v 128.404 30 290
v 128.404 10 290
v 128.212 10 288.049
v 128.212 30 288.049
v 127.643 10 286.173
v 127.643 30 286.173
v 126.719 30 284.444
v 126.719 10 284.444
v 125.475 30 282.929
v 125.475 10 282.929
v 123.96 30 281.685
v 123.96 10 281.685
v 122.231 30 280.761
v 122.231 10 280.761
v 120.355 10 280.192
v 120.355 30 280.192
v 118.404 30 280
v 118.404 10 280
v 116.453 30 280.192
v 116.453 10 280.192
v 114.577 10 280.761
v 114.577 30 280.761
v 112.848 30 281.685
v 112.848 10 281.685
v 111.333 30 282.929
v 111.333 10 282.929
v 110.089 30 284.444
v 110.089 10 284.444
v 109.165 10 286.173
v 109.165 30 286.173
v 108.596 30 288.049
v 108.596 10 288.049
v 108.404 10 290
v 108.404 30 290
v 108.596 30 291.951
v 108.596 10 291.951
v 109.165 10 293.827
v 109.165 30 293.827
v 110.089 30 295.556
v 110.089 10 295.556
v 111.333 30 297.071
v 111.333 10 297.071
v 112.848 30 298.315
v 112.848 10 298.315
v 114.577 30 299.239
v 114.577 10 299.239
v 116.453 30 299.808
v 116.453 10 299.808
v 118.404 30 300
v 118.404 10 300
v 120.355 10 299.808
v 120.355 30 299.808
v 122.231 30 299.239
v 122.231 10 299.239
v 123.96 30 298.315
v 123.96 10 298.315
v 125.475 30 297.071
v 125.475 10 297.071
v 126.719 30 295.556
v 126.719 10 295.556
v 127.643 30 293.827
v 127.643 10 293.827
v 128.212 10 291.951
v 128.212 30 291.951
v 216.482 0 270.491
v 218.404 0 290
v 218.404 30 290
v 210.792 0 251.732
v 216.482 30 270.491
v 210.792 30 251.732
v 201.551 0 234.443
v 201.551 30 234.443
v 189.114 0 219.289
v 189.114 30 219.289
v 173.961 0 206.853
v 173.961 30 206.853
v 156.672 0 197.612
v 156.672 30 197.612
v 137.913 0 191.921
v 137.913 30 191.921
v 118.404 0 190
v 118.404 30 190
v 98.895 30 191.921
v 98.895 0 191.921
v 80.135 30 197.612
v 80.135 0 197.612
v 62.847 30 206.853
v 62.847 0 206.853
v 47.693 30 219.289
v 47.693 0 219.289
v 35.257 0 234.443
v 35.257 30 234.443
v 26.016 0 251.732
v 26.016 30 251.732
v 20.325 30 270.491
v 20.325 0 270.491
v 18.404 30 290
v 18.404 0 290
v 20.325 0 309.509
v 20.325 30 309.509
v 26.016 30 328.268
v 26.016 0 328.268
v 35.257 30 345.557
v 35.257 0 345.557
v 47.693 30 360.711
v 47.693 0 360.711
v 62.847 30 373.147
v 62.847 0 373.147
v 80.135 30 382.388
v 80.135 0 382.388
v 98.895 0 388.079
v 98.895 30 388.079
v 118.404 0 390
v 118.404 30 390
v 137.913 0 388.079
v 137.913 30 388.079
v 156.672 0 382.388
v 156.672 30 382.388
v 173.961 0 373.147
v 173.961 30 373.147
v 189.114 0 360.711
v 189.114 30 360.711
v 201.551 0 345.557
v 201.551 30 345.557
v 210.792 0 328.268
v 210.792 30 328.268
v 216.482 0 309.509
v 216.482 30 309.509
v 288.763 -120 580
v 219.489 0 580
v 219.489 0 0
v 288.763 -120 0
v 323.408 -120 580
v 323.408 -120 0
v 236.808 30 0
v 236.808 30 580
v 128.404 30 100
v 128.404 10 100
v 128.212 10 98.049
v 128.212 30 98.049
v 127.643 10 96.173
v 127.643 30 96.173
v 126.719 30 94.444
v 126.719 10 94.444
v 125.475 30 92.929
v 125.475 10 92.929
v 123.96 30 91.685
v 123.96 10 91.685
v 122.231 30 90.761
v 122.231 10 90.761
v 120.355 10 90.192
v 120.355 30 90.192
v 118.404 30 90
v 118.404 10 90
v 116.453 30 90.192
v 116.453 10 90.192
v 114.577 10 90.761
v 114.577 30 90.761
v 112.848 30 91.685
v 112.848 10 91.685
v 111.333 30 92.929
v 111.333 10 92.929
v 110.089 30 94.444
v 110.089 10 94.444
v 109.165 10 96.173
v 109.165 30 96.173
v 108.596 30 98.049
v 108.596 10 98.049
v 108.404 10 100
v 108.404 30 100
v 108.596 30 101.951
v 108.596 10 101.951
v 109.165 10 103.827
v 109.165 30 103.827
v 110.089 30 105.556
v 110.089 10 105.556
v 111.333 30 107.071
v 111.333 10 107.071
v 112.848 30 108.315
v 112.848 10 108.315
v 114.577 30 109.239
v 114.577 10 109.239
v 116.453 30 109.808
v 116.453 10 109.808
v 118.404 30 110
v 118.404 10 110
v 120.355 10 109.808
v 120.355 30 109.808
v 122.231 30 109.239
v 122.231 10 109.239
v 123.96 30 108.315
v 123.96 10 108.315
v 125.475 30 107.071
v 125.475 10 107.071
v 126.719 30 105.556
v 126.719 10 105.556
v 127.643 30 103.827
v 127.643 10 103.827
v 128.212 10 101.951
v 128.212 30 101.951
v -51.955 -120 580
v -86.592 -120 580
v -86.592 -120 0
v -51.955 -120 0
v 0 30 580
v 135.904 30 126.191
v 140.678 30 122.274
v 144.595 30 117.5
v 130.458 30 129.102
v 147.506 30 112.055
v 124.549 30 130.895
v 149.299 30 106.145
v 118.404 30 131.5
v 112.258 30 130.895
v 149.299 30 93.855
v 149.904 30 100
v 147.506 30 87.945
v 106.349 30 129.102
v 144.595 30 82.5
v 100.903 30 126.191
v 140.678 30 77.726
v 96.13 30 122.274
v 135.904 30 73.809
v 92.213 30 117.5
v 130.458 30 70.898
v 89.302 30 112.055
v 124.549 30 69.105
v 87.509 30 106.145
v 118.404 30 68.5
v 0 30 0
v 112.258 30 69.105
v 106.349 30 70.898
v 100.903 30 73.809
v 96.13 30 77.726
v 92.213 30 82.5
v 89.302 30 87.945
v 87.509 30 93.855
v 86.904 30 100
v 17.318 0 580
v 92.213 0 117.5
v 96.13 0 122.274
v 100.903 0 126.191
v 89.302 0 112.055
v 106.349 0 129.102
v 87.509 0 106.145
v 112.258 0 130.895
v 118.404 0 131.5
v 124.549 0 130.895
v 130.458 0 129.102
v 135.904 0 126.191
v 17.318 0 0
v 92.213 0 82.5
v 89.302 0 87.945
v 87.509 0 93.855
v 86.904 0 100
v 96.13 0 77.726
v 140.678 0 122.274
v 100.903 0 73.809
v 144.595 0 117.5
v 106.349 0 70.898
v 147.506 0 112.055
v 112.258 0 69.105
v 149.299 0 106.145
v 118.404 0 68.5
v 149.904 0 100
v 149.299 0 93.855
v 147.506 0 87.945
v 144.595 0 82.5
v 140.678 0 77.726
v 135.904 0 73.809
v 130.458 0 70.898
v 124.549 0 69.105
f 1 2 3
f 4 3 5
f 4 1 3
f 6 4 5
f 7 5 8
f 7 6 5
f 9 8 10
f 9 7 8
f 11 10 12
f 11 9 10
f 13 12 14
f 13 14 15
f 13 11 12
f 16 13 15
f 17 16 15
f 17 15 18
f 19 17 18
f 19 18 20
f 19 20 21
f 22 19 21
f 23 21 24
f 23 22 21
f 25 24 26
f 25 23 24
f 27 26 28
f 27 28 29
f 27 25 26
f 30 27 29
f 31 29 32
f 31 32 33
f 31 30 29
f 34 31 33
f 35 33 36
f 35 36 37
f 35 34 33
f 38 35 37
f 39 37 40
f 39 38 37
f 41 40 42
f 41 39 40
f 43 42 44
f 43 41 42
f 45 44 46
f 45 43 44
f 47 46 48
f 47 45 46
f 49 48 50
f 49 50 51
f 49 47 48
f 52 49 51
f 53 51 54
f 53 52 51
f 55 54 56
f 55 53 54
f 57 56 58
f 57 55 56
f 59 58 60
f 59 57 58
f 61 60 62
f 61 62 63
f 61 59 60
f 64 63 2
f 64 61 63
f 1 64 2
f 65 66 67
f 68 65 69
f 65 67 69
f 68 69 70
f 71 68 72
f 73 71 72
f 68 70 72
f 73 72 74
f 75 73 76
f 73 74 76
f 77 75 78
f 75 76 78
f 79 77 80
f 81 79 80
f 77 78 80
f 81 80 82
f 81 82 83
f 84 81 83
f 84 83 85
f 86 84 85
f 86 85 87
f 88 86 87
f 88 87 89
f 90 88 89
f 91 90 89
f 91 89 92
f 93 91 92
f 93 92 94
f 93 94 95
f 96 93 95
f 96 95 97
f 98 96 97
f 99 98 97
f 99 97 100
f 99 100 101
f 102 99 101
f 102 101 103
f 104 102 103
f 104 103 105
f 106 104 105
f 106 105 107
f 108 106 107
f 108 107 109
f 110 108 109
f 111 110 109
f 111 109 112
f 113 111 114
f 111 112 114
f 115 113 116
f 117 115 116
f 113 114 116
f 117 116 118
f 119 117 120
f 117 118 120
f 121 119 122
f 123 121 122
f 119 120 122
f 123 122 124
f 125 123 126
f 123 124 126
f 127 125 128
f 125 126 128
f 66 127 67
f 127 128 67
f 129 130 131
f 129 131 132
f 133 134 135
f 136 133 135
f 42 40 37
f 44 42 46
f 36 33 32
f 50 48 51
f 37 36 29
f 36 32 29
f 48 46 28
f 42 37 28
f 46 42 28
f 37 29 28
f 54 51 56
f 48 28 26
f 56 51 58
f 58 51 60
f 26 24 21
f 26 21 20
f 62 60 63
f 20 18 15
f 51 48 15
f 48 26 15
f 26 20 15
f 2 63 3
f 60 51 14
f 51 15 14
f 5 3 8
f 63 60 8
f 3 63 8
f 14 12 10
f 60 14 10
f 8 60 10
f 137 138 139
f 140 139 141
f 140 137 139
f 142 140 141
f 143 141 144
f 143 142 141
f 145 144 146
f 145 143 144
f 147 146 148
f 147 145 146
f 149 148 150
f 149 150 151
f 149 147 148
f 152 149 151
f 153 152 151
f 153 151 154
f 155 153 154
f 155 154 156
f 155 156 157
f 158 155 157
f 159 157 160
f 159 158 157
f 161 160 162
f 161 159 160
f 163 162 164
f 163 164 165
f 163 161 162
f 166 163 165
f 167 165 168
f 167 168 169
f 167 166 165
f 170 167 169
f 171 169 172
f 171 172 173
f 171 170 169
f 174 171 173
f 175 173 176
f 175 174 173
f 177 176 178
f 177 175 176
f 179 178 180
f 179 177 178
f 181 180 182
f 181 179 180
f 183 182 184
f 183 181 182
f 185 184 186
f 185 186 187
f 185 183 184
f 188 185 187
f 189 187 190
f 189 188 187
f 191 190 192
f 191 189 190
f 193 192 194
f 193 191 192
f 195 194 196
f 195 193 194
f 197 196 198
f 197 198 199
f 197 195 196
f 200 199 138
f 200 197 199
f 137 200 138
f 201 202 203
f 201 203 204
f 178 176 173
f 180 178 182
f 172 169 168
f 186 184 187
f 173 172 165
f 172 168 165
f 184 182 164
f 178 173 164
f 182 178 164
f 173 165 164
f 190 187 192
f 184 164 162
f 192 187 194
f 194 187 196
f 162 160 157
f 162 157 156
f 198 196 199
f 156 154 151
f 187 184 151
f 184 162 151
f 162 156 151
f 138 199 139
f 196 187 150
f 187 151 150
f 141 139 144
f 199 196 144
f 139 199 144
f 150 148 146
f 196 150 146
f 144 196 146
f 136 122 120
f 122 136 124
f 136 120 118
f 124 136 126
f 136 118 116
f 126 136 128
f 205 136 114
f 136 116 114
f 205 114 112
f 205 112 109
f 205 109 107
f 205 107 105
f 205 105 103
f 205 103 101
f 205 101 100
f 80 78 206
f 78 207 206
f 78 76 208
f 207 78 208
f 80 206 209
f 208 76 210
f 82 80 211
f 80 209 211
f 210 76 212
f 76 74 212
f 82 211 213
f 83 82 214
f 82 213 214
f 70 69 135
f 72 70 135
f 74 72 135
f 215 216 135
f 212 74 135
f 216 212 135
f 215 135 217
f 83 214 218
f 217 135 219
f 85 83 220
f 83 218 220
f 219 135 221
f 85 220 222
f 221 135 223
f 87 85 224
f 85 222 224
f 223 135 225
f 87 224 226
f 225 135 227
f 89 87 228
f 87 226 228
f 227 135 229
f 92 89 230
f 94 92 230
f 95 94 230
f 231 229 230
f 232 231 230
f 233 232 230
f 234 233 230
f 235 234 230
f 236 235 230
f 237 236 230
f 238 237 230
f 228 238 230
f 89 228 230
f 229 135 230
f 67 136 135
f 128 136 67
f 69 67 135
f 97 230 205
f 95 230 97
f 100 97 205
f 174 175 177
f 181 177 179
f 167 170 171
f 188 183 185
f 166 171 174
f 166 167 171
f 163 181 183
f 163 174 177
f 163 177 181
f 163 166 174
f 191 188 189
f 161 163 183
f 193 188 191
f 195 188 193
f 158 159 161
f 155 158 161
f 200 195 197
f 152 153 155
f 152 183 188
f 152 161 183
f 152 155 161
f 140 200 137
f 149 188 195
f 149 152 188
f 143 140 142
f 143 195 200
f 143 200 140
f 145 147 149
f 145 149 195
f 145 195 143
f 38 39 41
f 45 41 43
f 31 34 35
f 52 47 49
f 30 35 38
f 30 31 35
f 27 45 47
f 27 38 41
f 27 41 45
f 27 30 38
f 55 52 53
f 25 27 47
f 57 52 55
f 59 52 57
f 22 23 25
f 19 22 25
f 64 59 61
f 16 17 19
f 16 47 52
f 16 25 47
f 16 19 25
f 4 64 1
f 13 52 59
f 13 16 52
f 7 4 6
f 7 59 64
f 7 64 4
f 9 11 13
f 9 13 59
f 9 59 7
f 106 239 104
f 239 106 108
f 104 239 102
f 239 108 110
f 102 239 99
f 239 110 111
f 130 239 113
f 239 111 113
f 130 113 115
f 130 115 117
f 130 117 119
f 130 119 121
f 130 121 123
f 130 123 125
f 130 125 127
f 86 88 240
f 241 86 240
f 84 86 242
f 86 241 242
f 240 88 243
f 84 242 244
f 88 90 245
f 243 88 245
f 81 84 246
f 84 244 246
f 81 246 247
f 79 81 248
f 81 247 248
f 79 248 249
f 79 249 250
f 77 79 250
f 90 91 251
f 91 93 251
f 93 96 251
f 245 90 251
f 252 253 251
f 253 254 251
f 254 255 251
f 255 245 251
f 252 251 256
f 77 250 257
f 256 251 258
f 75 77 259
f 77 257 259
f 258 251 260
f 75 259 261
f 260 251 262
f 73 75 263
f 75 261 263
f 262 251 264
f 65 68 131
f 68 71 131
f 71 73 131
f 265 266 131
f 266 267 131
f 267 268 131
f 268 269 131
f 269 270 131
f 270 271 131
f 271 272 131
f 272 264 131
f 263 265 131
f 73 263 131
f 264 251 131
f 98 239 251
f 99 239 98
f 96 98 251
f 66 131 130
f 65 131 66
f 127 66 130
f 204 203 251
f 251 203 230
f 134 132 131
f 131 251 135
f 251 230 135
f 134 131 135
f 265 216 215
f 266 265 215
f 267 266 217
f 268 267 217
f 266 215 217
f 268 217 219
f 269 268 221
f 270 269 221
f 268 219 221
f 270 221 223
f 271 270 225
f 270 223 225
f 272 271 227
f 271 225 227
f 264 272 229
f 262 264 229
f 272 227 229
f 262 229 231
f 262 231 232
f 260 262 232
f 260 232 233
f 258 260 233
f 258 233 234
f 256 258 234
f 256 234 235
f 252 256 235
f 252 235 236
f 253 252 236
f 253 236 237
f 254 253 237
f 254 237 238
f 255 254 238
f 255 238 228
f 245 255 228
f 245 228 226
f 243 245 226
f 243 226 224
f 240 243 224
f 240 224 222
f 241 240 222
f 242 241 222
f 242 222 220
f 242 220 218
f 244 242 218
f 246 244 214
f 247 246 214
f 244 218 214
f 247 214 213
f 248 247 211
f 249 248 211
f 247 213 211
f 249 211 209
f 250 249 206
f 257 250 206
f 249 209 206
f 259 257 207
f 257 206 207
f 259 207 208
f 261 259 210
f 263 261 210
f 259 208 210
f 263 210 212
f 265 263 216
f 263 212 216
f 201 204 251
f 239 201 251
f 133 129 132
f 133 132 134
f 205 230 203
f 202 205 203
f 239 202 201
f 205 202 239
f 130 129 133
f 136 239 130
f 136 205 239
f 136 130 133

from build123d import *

# Parameters (mm, degrees)
BOSS_EXTRU_1_DEPTH      = 580
ENL_V_MAT_EXTRU_1_REACH = 152
ESQUISSE2_R             = 100
ESQUISSE2_R_2           = 31.5
ESQUISSE4_R             = 10
BOSS_EXTRU_2_DEPTH      = 20
ESQUISSE5_R             = 10
BOSS_EXTRU_3_DEPTH      = 20


with BuildPart() as part:
    # Esquisse1 → Boss.-Extru.1 (new body)
    with BuildSketch(Plane.XY):
        Polygon((236.807621582, 30), (0, 30), (-86.592378418, -120), (-51.955427051, -120), (17.318475684, 0), (219.489145899, 0), (288.763048633, -120), (323.407621582, -120), align=None)
    extrude(amount=BOSS_EXTRU_1_DEPTH)

    # Esquisse2 → Enlèv. mat.-Extru.1 (cut, up to next)
    with BuildSketch(Plane(origin=(0, 30, 0), x_dir=(1, 0, 0), z_dir=(0, 1, 0)), mode=Mode.PRIVATE) as enl_v_mat_extru_1_sk1:
        with Locations((118.403810791, -290)):
            Circle(ESQUISSE2_R)
    enl_v_mat_extru_1_tool1 = extrude(enl_v_mat_extru_1_sk1.sketch, amount=-ENL_V_MAT_EXTRU_1_REACH, mode=Mode.PRIVATE) & part.part
    add(enl_v_mat_extru_1_tool1.solids().sort_by_distance((118.403811, 30, 290))[0], mode=Mode.SUBTRACT)
    # Esquisse2 → Enlèv. mat.-Extru.1 (cut, up to next)
    with BuildSketch(Plane(origin=(0, 30, 0), x_dir=(1, 0, 0), z_dir=(0, 1, 0)), mode=Mode.PRIVATE) as enl_v_mat_extru_1_sk2:
        with Locations((118.403810791, -100)):
            Circle(ESQUISSE2_R_2)
    enl_v_mat_extru_1_tool2 = extrude(enl_v_mat_extru_1_sk2.sketch, amount=-ENL_V_MAT_EXTRU_1_REACH, mode=Mode.PRIVATE) & part.part
    add(enl_v_mat_extru_1_tool2.solids().sort_by_distance((118.403811, 30, 100))[0], mode=Mode.SUBTRACT)


with BuildPart() as body_2:
    # Esquisse4 → Boss.-Extru.2 (new body)
    with BuildSketch(Plane(origin=(0, 30, 0), x_dir=(1, 0, 0), z_dir=(0, 1, 0))):
        with Locations((118.403810791, -290)):
            Circle(ESQUISSE4_R)
    extrude(amount=-BOSS_EXTRU_2_DEPTH)


with BuildPart() as body_3:
    # Esquisse5 → Boss.-Extru.3 (new body)
    with BuildSketch(Plane(origin=(0, 30, 0), x_dir=(1, 0, 0), z_dir=(0, 1, 0))):
        with Locations((118.403810791, -100)):
            Circle(ESQUISSE5_R)
    extrude(amount=-BOSS_EXTRU_3_DEPTH)


solid = Compound([part.part, body_2.part, body_3.part])
